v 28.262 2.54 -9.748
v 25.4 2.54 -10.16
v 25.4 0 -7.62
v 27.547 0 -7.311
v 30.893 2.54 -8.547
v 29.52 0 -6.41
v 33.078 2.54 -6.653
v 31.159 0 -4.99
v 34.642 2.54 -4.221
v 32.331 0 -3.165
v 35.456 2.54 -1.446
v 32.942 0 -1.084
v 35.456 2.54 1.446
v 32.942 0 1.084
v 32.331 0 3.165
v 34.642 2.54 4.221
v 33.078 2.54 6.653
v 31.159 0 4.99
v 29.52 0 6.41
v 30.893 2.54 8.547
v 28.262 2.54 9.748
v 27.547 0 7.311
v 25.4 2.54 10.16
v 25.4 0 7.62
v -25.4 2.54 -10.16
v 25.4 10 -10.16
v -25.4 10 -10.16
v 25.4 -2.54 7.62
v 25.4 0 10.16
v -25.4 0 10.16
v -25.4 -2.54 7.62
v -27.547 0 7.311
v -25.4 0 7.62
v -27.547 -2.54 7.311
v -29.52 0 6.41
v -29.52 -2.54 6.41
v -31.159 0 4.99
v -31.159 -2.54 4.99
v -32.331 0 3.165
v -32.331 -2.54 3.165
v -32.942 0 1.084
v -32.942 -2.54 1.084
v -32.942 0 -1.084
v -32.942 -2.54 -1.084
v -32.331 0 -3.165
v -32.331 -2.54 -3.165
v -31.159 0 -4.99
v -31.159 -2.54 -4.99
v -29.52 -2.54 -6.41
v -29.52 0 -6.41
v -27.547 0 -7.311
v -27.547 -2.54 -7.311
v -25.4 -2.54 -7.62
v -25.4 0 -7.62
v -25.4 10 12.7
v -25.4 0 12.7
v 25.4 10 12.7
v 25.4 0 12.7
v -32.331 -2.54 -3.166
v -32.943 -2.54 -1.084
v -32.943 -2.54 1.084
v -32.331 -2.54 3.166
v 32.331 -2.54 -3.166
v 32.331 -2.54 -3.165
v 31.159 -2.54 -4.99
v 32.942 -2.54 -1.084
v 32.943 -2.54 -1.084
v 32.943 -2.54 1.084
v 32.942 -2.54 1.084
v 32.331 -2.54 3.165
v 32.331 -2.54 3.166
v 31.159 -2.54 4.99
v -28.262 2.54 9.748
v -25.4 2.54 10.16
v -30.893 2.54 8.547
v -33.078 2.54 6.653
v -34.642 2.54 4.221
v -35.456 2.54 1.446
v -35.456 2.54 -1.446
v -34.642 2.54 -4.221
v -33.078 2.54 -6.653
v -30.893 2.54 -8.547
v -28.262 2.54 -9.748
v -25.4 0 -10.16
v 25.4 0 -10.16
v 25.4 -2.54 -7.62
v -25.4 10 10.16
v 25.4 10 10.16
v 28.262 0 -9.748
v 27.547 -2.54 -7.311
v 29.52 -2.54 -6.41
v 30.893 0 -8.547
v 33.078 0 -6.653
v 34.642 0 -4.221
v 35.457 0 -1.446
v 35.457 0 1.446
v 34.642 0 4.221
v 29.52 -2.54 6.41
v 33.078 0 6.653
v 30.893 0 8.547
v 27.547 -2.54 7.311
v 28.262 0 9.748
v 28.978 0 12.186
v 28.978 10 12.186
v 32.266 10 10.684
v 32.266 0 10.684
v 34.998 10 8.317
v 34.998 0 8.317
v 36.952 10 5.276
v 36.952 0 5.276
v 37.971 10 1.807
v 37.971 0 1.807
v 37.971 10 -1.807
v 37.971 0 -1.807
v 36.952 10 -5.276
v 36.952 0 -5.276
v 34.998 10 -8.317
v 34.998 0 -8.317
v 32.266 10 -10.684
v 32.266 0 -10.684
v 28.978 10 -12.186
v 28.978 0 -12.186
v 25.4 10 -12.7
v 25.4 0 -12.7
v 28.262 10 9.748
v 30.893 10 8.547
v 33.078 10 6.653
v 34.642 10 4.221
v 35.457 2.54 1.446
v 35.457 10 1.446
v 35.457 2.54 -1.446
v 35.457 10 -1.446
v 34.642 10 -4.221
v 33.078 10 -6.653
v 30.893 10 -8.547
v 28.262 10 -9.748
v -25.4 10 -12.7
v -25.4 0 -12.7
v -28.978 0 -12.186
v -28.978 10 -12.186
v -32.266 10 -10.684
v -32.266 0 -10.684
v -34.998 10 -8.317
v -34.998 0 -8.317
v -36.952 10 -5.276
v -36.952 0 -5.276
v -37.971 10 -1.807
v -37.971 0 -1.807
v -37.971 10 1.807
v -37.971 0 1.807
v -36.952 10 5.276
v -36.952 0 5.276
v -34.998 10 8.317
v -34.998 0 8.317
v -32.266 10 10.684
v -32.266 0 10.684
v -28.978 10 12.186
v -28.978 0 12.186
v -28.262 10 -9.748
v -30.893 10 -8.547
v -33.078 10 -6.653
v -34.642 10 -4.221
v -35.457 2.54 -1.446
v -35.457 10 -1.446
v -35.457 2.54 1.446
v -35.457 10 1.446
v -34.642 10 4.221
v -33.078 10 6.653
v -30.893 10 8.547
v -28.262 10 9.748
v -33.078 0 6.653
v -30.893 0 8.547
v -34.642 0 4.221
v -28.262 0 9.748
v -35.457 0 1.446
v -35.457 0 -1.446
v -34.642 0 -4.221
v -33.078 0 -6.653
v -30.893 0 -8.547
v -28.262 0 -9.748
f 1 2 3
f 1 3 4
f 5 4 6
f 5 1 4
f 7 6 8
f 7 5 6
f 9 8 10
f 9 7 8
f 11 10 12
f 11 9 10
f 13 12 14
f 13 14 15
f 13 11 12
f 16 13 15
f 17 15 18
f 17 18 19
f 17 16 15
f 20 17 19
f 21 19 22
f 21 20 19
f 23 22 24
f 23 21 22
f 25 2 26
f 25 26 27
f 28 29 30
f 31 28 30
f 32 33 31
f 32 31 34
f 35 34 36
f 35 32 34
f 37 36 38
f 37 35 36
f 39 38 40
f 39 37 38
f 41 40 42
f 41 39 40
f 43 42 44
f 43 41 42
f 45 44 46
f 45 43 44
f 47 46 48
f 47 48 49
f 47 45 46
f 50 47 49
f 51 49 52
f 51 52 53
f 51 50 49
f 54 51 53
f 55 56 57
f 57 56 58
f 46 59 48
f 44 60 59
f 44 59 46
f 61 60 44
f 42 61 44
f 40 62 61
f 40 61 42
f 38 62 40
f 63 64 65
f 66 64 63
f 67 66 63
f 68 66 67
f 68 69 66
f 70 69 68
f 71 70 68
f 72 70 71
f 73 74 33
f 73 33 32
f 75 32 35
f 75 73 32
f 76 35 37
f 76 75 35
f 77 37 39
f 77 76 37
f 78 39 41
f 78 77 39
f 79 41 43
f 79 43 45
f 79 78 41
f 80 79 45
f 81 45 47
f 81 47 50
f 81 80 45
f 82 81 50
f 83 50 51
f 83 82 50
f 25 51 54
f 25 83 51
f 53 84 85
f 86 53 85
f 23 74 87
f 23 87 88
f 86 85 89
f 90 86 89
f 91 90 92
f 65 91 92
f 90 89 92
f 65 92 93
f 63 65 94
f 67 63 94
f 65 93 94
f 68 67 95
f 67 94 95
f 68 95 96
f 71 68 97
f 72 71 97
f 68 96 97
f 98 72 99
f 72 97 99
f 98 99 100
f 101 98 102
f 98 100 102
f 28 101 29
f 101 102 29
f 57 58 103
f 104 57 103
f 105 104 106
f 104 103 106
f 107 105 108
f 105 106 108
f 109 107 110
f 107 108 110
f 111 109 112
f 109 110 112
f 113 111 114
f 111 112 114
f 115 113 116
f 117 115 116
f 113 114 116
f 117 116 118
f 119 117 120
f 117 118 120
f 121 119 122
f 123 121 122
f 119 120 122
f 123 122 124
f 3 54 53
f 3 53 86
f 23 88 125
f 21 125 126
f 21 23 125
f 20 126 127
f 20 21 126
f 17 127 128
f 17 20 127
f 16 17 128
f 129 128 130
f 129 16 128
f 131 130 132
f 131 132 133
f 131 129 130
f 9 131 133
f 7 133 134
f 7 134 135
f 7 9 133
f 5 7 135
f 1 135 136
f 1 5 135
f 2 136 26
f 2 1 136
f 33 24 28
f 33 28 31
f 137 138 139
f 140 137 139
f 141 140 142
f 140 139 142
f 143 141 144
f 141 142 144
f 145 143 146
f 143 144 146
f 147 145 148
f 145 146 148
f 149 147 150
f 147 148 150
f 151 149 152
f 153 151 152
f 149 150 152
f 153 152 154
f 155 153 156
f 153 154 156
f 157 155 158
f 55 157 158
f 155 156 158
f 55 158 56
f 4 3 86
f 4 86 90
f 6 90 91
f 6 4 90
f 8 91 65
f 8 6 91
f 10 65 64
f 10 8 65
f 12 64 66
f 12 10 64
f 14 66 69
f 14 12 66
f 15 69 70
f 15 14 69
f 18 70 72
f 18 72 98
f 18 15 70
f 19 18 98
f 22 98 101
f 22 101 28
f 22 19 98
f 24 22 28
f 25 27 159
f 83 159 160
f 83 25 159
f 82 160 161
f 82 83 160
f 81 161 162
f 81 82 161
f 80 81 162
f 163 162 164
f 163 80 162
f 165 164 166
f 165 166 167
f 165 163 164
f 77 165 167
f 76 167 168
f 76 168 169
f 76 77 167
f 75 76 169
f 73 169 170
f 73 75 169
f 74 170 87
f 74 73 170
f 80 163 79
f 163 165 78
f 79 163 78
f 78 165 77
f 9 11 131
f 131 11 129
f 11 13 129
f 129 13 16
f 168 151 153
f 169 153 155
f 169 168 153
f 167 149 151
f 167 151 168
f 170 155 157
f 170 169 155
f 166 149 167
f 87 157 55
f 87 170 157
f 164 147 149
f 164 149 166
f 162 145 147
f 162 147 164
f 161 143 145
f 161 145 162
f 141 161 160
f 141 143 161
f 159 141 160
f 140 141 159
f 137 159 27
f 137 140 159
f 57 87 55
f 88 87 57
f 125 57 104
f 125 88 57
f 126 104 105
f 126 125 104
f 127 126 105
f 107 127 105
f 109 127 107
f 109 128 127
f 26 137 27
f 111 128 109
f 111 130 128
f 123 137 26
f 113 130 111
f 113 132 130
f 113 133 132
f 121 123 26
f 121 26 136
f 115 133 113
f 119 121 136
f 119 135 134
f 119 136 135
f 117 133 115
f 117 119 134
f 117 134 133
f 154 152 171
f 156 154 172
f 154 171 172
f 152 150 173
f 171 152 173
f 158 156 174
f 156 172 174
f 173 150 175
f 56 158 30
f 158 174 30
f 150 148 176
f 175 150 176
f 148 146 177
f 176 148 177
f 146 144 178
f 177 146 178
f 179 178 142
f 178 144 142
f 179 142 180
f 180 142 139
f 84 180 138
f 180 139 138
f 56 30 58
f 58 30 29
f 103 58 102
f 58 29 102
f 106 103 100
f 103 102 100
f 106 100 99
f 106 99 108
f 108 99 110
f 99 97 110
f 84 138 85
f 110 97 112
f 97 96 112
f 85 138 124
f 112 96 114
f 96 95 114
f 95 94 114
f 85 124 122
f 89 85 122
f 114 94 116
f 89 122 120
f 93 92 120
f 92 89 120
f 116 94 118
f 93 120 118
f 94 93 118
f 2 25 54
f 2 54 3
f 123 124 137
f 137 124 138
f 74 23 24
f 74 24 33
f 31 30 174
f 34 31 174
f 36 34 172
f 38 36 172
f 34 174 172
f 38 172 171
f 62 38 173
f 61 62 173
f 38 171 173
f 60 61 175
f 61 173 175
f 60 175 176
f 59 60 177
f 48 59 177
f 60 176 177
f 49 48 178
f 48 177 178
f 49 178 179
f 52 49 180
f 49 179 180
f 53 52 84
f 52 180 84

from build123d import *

# Parameters (mm, degrees)
BOSS_EXTRUDE1_DEPTH      = 10
BOSS_EXTRUDE2_DEPTH      = 2.54
BOSS_EXTRUDE2_DEPTH_BACK = 2.54
CHAMFER1_SIZE            = 2.54


with BuildPart() as part:
    # Sketch1 → Boss-Extrude1 (new body)
    with BuildSketch(Plane(origin=(0, 0, 0), x_dir=(1, 0, 0), z_dir=(0, 1, 0))):
        with BuildLine():
            Line((-25.4, -12.7), (25.4, -12.7))
            ThreePointArc((25.4, -12.7), (38.1, 0), (25.4, 12.7))
            Line((25.4, 12.7), (-25.4, 12.7))
            ThreePointArc((-25.4, 12.7), (-38.1, 0), (-25.4, -12.7))
        make_face()
        with BuildLine():
            Line((-25.4, -10.16), (25.4, -10.16))
            ThreePointArc((25.4, -10.16), (35.56, 0), (25.4, 10.16))
            Line((25.4, 10.16), (-25.4, 10.16))
            ThreePointArc((-25.4, 10.16), (-35.56, 0), (-25.4, -10.16))
        make_face(mode=Mode.SUBTRACT)
    extrude(amount=BOSS_EXTRUDE1_DEPTH)

    # Sketch3 → Boss-Extrude2 (add, two sides: drawn at the far end of the back side and taken through both)
    with BuildSketch(Plane.XZ.offset(-BOSS_EXTRUDE2_DEPTH_BACK)):
        with BuildLine():
            Line((25.4, 10.16), (-25.4, 10.16))
            ThreePointArc((-25.4, 10.16), (-35.56, 0), (-25.4, -10.16))
            Line((-25.4, -10.16), (25.4, -10.16))
            ThreePointArc((25.4, -10.16), (35.56, 0), (25.4, 10.16))
        make_face()
        with BuildLine():
            Line((-25.4, -7.62), (25.4, -7.62))
            ThreePointArc((25.4, -7.62), (33.02, 0), (25.4, 7.62))
            Line((25.4, 7.62), (-25.4, 7.62))
            ThreePointArc((-25.4, 7.62), (-33.02, 0), (-25.4, -7.62))
        make_face(mode=Mode.SUBTRACT)
    extrude(amount=BOSS_EXTRUDE2_DEPTH + BOSS_EXTRUDE2_DEPTH_BACK)

    # Chamfer1
    chamfer1_edges = [part.edges().sort_by_distance(p)[0] for p in [
        (35.56, -2.54, 0),
        (0, -2.54, 10.16),
        (0, -2.54, -10.16),
        (-35.56, -2.54, 0),
        (0, 2.54, 7.62),
        (-33.02, 2.54, 0),
        (33.02, 2.54, 0),
        (0, 2.54, -7.62),
    ]]
    chamfer(chamfer1_edges, length=CHAMFER1_SIZE - 0.0001)  # a hair under: the kernel refuses the full size


solid = part.part
